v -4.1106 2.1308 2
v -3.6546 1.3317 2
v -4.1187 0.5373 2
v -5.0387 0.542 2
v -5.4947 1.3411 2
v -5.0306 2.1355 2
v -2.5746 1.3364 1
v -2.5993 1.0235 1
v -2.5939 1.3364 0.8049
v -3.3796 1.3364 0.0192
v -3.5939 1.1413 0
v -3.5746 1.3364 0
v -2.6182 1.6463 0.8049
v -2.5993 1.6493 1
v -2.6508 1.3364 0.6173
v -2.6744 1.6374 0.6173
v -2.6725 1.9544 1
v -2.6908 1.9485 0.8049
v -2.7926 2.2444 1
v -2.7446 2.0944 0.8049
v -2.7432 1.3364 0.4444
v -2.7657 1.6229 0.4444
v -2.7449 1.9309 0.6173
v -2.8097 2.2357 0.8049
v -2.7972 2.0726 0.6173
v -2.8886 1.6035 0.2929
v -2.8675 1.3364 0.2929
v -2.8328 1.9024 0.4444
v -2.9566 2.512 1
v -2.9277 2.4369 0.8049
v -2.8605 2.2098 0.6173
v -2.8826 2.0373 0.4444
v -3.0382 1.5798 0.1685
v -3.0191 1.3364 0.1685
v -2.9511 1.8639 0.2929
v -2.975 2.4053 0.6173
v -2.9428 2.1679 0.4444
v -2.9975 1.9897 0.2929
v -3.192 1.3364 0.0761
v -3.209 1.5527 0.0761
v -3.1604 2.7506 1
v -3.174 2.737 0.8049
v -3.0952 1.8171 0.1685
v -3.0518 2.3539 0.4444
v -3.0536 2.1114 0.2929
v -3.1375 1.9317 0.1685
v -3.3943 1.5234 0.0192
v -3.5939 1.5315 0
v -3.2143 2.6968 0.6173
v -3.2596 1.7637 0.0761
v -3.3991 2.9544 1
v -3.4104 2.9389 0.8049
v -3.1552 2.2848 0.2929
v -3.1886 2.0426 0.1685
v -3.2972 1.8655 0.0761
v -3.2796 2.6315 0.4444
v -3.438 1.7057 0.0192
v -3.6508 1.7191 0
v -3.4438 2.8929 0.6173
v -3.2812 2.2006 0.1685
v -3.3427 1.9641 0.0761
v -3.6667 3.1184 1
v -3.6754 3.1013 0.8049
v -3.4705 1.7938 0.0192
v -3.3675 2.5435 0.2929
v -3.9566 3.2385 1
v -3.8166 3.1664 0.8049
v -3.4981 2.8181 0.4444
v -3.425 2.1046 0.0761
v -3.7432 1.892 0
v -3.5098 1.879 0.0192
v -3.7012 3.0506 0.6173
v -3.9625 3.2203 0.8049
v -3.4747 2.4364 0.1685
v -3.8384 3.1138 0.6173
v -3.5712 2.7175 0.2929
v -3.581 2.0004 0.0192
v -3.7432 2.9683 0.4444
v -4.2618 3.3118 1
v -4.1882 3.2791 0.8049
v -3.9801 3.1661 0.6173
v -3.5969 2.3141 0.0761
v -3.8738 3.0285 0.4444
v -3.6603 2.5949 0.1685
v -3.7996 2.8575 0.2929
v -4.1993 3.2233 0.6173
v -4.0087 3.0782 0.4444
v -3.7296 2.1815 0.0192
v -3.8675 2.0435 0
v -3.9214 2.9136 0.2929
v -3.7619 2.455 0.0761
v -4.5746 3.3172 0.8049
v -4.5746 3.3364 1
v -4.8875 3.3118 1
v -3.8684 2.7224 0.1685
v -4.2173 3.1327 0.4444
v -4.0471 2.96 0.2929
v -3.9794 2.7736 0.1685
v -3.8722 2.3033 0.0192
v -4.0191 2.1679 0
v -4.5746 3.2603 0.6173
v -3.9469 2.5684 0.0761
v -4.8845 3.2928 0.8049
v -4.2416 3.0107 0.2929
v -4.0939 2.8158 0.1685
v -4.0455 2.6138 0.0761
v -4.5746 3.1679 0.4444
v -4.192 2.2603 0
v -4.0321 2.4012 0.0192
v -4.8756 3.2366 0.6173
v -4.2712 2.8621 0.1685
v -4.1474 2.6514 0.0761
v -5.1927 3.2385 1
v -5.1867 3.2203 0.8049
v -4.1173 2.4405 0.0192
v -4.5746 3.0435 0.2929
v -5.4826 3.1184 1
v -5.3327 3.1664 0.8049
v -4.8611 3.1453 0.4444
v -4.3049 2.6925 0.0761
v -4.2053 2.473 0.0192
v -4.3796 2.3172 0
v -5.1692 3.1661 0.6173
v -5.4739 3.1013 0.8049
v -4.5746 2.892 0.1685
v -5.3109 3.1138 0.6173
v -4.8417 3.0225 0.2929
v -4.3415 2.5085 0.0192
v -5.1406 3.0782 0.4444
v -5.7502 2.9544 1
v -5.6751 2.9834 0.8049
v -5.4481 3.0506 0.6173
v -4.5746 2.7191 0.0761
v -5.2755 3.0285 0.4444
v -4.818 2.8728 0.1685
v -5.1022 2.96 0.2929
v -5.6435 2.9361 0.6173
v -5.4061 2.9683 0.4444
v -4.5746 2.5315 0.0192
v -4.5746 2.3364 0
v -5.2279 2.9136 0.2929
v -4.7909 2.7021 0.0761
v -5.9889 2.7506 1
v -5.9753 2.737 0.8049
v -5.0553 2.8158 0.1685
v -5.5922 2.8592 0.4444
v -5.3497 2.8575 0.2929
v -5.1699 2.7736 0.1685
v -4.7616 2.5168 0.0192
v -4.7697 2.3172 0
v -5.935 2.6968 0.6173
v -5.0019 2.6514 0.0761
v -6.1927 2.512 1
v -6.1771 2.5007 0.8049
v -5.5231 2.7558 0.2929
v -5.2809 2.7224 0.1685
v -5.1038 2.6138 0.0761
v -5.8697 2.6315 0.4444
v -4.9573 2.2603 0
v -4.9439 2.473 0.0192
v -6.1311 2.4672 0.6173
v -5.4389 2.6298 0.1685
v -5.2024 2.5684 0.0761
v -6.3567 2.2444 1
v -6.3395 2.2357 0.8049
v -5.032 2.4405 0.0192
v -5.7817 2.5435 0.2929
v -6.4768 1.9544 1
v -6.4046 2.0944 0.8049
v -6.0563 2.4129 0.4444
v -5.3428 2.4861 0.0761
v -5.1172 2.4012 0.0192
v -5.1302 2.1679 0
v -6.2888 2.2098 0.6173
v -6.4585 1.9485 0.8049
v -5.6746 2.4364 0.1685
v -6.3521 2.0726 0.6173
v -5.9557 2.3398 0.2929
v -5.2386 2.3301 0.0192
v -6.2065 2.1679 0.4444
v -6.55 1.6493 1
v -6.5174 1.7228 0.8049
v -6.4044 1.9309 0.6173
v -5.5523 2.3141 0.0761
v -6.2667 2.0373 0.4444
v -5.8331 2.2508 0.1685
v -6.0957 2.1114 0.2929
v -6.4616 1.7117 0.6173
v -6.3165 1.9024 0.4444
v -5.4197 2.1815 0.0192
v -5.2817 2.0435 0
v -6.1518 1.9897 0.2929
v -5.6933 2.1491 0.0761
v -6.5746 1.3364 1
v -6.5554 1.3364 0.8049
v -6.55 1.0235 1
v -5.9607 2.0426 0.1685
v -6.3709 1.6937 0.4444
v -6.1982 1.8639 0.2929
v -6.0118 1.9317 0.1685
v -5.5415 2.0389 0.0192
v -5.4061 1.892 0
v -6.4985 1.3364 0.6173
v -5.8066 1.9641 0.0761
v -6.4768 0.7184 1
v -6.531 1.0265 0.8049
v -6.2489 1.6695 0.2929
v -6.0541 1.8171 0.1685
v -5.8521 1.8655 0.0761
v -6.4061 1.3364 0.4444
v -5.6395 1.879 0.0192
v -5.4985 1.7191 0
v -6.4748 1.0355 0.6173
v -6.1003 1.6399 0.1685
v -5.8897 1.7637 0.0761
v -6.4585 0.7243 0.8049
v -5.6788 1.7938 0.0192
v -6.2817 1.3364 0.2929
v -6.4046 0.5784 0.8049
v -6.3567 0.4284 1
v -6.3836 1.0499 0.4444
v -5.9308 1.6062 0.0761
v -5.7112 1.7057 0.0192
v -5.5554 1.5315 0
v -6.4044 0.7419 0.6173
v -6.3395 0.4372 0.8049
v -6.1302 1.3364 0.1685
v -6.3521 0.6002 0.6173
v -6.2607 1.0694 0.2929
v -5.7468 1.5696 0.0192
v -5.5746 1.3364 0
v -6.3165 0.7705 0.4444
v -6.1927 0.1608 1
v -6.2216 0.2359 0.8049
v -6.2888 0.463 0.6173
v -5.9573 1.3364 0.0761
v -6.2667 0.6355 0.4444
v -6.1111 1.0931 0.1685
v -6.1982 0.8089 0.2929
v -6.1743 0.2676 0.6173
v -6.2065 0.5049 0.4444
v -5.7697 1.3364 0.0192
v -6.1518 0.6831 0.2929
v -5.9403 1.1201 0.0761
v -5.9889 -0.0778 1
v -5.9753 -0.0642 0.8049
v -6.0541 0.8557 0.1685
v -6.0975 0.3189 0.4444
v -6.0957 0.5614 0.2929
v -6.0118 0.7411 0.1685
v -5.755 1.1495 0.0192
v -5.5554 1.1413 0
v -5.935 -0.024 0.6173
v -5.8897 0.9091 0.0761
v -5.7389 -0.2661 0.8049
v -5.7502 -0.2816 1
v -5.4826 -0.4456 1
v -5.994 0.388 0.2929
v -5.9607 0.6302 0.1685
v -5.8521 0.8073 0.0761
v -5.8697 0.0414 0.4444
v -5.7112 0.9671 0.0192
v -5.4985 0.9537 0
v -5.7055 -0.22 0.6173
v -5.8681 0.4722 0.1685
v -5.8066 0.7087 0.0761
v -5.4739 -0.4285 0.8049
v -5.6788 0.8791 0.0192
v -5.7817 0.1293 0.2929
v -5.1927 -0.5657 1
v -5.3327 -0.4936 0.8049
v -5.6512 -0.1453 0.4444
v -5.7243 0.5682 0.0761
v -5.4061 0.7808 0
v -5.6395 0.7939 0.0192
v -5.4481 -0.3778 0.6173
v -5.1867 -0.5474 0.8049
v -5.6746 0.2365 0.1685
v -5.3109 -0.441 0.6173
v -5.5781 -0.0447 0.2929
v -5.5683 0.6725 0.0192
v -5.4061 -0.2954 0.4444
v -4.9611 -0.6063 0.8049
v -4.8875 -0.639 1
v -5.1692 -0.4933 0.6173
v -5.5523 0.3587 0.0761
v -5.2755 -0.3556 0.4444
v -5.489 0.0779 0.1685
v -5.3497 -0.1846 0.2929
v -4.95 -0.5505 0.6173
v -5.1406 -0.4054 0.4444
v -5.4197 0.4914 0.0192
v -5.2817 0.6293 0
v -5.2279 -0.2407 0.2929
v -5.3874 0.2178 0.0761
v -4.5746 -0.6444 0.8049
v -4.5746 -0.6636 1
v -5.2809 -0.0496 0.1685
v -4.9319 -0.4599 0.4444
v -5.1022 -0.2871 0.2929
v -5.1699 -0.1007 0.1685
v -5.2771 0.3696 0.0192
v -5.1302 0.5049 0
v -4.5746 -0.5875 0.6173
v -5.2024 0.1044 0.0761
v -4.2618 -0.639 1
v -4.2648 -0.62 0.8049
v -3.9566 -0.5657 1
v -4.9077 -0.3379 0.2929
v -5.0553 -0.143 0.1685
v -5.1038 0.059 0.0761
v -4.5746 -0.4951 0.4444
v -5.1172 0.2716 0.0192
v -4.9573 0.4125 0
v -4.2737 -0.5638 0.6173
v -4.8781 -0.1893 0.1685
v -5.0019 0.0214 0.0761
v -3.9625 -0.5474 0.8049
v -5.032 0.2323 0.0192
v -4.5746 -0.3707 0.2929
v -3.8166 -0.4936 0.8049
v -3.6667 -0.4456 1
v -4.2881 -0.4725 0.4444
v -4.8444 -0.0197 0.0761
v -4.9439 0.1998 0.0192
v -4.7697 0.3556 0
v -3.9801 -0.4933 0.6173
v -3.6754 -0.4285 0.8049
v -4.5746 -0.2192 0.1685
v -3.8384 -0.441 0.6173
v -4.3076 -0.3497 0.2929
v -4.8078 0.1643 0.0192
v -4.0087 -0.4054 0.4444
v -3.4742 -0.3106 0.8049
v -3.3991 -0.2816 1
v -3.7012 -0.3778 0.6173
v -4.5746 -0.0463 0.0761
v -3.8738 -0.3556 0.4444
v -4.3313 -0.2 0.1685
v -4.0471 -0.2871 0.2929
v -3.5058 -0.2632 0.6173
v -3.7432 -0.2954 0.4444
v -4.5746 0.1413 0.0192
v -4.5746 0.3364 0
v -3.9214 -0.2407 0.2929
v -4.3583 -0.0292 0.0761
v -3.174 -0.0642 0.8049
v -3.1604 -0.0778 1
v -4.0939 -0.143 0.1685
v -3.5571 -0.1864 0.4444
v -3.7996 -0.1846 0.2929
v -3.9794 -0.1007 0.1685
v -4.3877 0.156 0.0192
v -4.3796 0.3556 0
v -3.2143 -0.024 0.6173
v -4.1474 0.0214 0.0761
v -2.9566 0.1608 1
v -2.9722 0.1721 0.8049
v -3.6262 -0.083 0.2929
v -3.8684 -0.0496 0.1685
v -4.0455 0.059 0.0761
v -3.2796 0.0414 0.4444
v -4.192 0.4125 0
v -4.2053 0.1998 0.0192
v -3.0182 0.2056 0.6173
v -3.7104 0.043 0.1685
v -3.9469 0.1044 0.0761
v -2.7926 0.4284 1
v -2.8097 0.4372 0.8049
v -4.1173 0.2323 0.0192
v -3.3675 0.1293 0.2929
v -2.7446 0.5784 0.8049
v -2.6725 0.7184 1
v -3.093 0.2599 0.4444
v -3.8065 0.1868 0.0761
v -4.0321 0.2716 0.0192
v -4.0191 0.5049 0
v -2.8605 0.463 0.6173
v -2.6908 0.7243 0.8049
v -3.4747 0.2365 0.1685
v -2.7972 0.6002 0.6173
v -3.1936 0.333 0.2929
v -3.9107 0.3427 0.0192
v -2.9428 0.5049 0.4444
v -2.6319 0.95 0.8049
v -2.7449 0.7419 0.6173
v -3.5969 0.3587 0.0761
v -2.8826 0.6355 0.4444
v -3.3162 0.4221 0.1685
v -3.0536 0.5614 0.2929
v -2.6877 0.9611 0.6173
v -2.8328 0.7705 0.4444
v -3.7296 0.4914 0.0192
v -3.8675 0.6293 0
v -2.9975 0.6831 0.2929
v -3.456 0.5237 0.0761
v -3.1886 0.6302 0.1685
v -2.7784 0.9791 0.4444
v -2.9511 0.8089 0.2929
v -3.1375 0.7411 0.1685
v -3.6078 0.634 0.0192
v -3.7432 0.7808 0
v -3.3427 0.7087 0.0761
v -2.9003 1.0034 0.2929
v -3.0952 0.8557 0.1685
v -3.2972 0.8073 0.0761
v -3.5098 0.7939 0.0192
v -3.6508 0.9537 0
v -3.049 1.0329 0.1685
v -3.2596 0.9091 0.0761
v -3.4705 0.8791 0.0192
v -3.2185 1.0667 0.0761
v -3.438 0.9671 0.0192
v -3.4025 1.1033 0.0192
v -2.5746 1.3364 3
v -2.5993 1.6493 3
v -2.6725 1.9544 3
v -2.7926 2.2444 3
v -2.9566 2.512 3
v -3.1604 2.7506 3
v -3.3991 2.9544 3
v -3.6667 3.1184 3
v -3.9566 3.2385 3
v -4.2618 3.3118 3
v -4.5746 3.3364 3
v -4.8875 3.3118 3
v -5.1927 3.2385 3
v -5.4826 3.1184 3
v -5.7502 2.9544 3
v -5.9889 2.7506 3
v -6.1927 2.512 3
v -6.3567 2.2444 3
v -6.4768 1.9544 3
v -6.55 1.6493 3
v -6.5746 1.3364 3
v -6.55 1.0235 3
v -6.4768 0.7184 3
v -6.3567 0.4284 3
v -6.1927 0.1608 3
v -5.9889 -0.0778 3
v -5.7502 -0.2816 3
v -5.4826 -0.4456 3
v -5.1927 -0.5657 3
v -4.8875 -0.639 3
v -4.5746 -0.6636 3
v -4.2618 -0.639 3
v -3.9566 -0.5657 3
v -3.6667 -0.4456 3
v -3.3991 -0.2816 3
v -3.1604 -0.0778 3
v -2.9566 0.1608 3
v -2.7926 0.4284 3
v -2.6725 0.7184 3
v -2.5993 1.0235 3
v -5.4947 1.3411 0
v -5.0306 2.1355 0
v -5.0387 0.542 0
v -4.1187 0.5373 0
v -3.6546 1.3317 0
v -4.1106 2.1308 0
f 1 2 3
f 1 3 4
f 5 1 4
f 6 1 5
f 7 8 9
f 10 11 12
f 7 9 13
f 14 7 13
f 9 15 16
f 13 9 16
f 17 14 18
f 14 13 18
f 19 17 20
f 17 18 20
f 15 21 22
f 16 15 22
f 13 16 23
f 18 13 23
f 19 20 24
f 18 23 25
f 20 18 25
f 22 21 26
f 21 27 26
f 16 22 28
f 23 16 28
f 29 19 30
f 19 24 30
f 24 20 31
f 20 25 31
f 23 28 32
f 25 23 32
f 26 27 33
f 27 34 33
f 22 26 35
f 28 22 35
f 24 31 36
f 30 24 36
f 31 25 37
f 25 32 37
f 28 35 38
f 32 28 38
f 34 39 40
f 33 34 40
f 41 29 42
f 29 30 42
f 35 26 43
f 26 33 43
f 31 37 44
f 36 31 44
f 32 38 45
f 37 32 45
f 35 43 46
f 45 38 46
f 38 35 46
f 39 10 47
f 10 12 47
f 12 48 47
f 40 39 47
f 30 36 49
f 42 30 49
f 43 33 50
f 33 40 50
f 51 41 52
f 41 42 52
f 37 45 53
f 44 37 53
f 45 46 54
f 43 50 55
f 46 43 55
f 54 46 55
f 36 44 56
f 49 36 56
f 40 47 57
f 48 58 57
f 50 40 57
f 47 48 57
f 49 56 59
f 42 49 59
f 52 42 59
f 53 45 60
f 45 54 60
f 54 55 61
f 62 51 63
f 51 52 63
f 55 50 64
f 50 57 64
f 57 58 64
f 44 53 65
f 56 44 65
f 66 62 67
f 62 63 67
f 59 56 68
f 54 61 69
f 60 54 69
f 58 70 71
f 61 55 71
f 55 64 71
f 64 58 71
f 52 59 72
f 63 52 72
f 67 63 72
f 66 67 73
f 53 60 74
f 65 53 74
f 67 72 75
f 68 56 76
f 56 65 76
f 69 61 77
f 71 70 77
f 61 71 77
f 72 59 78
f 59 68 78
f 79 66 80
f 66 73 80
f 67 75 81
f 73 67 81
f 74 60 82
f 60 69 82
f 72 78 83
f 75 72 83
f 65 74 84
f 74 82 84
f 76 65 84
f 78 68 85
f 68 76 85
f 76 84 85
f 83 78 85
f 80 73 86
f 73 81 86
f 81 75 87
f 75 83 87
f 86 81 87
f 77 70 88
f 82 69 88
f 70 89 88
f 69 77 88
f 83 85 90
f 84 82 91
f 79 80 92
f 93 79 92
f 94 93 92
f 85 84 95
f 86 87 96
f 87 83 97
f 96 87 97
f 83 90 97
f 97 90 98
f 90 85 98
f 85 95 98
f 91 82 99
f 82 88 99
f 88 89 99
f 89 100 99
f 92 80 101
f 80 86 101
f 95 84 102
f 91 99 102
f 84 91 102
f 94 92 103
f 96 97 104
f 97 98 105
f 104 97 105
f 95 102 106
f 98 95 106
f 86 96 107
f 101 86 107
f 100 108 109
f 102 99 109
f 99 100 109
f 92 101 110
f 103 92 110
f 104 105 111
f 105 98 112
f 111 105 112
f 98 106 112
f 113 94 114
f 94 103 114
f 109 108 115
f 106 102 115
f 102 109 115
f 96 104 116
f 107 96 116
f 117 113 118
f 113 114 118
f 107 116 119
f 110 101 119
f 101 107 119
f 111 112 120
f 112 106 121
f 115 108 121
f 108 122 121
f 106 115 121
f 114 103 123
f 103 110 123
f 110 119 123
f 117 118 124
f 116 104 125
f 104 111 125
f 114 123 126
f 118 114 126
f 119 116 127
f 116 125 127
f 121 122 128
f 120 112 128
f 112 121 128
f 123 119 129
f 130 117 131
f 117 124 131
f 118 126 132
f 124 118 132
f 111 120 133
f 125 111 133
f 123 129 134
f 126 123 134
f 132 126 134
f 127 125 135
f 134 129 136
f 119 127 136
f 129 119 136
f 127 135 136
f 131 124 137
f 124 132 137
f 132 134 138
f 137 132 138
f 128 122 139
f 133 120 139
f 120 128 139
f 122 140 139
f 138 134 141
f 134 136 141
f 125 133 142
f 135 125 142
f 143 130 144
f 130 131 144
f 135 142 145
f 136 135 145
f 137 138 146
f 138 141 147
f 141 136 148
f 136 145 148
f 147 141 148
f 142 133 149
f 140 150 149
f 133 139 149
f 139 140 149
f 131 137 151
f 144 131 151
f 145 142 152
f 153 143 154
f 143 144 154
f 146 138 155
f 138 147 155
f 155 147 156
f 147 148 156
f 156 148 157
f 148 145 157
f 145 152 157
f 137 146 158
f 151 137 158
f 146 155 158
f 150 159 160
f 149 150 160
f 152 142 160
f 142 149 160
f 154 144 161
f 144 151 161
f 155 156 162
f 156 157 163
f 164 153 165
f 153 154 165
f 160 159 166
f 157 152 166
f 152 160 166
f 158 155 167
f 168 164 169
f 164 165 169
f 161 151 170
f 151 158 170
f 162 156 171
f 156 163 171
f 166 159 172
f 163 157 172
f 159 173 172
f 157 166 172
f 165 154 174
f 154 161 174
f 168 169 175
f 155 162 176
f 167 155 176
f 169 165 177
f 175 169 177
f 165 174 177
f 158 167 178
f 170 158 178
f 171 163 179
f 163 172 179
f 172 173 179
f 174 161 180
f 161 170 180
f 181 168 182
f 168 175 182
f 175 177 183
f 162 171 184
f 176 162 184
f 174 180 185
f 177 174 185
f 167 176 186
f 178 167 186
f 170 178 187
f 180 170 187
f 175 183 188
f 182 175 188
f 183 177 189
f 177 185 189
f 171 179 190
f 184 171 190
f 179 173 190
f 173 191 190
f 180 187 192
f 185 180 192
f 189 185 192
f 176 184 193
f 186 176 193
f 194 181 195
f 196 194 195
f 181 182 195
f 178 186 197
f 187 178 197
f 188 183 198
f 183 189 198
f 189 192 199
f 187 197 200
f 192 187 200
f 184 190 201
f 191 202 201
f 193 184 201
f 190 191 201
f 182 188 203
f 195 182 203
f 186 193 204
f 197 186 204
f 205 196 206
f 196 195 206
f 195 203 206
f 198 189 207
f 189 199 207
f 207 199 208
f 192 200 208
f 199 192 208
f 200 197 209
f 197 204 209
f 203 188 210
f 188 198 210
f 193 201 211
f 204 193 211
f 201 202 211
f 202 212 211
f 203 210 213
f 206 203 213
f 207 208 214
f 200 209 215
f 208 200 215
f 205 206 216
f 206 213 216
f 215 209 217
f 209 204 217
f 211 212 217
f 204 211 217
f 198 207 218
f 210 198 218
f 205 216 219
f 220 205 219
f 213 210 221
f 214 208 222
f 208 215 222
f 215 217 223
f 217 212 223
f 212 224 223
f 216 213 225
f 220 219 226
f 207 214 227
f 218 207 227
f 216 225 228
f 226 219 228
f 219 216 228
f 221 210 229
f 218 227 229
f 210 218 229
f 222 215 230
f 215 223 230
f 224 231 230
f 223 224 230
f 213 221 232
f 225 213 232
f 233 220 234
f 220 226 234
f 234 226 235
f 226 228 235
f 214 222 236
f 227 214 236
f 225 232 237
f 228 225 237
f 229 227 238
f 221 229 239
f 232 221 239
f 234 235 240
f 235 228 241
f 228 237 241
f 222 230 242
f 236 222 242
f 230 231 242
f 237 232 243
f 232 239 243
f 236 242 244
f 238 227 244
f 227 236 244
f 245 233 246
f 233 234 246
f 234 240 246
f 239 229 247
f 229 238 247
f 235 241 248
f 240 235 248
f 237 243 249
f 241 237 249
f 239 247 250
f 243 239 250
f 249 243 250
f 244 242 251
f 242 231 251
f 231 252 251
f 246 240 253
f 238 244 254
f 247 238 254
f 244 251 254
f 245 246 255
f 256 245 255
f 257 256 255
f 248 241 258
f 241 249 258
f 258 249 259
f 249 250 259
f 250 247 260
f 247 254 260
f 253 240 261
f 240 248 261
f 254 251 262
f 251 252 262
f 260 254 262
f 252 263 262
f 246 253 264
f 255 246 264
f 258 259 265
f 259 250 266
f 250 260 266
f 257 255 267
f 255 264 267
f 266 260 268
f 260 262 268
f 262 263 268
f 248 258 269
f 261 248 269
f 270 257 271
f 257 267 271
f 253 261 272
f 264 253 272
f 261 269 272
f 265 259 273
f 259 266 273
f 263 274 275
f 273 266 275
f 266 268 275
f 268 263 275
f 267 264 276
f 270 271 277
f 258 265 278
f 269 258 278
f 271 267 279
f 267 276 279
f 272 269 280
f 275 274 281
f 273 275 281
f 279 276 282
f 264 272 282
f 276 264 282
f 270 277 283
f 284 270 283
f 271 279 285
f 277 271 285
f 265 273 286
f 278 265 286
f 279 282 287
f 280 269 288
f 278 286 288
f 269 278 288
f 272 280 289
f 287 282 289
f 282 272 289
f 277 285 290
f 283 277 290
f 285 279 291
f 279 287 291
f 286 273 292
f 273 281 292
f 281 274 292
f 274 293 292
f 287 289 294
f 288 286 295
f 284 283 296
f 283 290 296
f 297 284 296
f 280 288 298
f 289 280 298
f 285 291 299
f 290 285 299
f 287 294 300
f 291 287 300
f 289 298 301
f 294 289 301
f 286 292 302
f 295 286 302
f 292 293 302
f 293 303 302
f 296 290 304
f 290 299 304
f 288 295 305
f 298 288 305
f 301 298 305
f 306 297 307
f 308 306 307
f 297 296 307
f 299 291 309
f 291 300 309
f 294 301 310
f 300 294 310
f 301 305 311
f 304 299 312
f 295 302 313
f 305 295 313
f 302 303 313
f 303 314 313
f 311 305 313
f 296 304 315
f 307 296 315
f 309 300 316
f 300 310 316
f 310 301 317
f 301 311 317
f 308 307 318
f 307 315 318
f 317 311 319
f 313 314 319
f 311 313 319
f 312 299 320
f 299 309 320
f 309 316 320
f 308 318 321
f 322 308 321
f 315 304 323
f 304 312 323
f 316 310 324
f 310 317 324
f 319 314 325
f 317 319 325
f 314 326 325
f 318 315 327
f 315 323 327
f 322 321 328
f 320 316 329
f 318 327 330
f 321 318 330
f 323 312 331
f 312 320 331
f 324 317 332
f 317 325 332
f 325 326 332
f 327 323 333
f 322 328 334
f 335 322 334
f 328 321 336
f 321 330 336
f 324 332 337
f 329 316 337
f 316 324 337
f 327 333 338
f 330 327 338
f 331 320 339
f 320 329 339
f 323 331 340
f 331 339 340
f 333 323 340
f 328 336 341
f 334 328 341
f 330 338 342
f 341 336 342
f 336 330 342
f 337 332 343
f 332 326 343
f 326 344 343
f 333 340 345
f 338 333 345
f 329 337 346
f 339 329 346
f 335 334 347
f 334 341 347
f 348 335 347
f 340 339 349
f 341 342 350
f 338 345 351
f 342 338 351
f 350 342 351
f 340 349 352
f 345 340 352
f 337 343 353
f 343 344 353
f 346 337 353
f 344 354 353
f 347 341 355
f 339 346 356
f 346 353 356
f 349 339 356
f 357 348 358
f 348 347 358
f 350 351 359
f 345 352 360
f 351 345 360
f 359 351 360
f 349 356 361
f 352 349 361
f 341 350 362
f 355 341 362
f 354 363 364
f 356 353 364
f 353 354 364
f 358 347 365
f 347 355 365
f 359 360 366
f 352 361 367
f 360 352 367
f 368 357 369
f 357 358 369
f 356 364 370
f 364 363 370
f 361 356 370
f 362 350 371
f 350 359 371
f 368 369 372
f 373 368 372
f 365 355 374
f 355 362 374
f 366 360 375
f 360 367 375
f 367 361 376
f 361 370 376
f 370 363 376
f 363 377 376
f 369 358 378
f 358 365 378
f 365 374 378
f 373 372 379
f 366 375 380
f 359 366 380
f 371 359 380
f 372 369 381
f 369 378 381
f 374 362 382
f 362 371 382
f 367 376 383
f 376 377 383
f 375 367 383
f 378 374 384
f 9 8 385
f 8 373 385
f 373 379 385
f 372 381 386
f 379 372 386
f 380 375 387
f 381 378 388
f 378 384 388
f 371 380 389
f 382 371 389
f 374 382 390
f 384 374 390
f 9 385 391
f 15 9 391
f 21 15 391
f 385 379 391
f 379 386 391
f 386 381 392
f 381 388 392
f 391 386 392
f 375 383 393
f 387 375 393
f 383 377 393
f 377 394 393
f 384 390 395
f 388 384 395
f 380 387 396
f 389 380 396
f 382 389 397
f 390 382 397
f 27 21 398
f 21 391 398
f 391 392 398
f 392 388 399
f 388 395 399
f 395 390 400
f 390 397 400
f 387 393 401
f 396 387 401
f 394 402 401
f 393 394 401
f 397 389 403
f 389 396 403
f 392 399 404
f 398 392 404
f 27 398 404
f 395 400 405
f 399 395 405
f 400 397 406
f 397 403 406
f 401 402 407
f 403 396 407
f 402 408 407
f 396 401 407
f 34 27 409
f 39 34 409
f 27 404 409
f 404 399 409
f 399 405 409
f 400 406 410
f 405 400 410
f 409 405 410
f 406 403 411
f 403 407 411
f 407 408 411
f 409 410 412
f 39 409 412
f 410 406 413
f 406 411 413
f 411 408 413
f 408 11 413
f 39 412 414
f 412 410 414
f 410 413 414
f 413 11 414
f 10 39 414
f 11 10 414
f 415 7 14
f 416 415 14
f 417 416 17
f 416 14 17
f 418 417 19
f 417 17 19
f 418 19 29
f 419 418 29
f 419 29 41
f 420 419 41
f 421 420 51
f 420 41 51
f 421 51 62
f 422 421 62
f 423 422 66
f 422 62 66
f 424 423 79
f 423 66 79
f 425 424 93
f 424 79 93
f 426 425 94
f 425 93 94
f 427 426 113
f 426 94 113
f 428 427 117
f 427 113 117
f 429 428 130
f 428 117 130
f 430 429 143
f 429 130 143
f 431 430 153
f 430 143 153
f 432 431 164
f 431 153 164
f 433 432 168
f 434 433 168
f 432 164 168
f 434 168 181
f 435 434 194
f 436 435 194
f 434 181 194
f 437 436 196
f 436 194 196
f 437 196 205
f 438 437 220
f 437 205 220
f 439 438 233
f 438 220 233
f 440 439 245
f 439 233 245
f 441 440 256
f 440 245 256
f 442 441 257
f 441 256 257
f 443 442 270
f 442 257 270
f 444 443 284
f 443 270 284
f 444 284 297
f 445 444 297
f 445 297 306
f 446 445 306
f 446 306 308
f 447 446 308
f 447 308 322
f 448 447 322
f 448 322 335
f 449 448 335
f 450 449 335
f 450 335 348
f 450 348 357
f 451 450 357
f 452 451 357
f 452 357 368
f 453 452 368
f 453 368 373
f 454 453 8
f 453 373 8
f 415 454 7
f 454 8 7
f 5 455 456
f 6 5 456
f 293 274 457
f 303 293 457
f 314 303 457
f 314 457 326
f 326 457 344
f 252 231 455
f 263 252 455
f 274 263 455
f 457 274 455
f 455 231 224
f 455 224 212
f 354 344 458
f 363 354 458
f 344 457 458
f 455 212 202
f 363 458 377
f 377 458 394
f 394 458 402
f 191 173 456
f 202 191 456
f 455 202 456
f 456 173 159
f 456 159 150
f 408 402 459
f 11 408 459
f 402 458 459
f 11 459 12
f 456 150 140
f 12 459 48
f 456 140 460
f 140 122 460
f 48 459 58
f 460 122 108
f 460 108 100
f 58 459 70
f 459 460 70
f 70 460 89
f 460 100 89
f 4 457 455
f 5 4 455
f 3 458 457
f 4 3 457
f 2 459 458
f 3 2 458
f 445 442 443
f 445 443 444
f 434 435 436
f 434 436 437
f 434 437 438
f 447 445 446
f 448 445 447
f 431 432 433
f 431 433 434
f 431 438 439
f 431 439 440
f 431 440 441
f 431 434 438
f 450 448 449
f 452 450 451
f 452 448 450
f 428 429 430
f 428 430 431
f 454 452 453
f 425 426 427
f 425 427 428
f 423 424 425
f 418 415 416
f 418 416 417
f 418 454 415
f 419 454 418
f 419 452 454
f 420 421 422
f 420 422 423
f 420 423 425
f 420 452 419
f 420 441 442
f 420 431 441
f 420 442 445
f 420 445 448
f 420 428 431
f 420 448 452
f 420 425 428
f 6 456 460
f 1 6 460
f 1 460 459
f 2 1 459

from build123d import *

# Parameters (mm, degrees)
SKETCH1_R           = 2
BOSS_EXTRUDE2_DEPTH = 3
CUT_EXTRUDE1_DEPTH  = 2
FILLET5_R           = 1


with BuildPart() as part:
    # Sketch1 → Boss-Extrude2 (new body)
    with BuildSketch(Plane.XY):
        with Locations((-4.574641492, 1.336412121)):
            Circle(SKETCH1_R)
    extrude(amount=BOSS_EXTRUDE2_DEPTH)

    # Sketch2 → Cut-Extrude1 (cut)
    with BuildSketch(Plane(origin=(0, 0, 0), x_dir=(-1, 0, 0), z_dir=(0, 0, -1))):
        Polygon((4.11056624, 2.130846028), (3.654603921, 1.331728117), (4.118679173, 0.53729421), (5.038716745, 0.541978214), (5.494679064, 1.341096126), (5.030603811, 2.135530033), align=None)
    extrude(amount=-CUT_EXTRUDE1_DEPTH, mode=Mode.SUBTRACT)

    # Fillet5
    fillet5_edges = [part.edges().sort_by_distance(p)[0] for p in [
        (-6.574641492, 1.336412121, 0),
    ]]
    fillet(fillet5_edges, radius=FILLET5_R)


solid = part.part
